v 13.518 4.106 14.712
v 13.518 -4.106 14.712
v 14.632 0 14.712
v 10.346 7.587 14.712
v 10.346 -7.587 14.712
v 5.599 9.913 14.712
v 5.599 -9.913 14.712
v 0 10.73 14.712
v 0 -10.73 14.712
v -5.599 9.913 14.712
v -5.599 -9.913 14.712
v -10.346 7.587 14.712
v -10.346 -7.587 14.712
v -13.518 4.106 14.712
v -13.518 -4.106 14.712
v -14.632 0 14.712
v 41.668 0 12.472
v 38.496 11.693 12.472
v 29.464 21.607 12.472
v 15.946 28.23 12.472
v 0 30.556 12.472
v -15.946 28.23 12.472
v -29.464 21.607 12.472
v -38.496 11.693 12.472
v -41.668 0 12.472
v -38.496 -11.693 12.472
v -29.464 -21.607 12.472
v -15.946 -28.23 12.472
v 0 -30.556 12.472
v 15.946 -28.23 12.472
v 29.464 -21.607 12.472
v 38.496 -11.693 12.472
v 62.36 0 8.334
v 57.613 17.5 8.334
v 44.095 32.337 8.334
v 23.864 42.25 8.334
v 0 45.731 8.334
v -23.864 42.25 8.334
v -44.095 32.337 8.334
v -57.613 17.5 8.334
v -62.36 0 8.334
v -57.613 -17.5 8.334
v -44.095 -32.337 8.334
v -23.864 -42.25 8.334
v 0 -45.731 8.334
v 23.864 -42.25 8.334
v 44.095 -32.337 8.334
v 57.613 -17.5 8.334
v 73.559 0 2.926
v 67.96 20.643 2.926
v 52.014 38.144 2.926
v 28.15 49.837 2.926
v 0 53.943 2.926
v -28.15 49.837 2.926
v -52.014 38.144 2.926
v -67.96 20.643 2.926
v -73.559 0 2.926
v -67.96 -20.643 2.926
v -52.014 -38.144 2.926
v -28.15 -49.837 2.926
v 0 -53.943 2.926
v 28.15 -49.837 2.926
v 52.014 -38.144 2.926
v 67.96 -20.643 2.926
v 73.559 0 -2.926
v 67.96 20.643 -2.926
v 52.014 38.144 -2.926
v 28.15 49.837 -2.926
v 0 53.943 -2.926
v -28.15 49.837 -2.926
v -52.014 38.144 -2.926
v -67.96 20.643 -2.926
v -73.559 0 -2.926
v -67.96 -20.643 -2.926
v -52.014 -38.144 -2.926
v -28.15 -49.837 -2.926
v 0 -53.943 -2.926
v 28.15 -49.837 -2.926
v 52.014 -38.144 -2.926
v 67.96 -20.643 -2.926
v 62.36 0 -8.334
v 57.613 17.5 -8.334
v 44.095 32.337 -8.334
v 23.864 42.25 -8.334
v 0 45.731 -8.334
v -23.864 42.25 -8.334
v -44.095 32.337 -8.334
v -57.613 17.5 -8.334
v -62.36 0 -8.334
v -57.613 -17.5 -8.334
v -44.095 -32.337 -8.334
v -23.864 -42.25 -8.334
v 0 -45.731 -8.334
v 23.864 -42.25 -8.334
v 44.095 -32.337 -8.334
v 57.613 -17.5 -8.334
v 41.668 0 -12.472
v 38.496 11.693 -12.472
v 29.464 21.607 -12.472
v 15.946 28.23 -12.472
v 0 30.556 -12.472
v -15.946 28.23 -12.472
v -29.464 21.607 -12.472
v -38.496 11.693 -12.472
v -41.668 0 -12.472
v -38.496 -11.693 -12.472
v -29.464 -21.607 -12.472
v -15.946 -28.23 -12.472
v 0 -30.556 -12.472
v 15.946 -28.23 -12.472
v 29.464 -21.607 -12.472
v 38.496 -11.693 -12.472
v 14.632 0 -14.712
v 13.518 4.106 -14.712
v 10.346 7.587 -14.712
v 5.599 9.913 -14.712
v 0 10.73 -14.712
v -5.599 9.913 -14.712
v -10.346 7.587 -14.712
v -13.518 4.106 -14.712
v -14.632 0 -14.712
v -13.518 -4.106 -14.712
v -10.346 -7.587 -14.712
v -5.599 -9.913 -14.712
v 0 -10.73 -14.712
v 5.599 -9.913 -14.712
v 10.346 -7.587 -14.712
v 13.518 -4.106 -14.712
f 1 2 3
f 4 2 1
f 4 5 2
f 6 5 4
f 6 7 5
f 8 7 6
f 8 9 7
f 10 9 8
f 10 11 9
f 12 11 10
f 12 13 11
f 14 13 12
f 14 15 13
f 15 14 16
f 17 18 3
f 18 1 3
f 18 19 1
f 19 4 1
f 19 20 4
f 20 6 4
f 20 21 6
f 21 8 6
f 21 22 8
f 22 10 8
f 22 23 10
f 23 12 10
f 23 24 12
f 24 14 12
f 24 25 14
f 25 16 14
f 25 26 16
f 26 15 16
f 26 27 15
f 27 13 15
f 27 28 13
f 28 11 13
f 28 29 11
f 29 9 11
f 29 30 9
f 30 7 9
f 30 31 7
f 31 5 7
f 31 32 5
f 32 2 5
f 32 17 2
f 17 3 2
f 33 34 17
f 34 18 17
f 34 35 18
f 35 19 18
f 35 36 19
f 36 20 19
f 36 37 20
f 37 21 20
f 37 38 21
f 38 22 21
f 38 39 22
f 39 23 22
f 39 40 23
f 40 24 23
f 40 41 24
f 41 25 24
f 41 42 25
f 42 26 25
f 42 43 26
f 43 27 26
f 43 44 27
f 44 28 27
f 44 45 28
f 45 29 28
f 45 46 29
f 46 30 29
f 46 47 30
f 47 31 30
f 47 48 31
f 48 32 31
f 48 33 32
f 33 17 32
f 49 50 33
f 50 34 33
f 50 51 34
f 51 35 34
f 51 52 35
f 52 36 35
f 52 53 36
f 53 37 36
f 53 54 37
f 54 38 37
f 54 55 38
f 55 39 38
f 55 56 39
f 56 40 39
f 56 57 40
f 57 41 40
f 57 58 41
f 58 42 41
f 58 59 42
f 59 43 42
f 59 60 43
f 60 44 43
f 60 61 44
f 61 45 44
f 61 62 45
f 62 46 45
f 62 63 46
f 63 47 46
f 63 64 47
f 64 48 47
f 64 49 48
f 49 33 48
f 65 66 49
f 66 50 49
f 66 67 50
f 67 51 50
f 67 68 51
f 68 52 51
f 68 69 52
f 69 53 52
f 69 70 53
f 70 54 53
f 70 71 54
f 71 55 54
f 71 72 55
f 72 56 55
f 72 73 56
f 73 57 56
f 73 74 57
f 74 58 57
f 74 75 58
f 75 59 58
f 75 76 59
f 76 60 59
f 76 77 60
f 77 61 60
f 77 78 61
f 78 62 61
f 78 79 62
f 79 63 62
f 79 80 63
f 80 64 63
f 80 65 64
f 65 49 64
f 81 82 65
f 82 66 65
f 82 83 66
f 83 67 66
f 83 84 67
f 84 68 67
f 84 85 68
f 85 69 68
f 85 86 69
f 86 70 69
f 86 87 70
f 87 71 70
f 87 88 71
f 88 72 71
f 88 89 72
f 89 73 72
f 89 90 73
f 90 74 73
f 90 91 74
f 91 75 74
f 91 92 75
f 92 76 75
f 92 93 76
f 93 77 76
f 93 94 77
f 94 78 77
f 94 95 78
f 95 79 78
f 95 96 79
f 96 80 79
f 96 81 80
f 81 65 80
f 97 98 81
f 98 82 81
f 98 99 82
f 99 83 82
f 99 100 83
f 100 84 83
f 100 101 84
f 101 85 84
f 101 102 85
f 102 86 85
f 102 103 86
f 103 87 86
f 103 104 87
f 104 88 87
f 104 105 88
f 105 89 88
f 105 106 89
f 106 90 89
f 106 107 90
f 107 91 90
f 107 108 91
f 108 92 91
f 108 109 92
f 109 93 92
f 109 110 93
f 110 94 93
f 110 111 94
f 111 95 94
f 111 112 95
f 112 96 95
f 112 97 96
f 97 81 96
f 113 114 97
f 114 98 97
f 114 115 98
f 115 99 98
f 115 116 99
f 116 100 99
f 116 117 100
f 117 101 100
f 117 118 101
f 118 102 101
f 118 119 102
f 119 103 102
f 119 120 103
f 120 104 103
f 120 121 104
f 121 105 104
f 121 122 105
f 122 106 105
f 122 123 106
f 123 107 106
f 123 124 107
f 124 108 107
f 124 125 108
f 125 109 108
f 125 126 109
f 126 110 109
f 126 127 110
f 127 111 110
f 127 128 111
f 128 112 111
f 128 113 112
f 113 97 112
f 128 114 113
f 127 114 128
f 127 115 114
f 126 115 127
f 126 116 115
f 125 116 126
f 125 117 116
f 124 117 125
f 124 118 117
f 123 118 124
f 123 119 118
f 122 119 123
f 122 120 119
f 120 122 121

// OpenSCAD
// Generated by SolidPython 1.0.1 on 2020-07-29 00:46:52


scale(v = [15, 11, 3]) {
	sphere(r = 5);
}
/***********************************************
*********      SolidPython code:      **********
************************************************
 
# import packages: SolidPython
from solid import *
from solid.utils import *
from itertools import chain, combinations, permutations


class Resize:

    def __init__(self, scad_file):
        self.scad_file = scad_file
        #self.scad_file = import_scad(scad_file)
        # cone/cylinder param:
        self.r1 = 0
        self.r2 = 0
        self.h = 0
        # rectangular prism param:
        self.w = 0
        self.l = 0
        # ellipse param:
        self.r = 0

    # import OpenScad code (file name corresponds to shape)


    # classify shape + parameters
    def assign(self, param1, param2, param3):
        if self.scad_file == 'cone.scad':
            self.r1 = param1
            self.r2 = param2
            self.h = param3
        elif self.scad_file == 'cylinder.scad':
            self.r1 = param1
            self.r2 = param2
            self.h = param3
        elif self.scad_file == 'rectangularPrism.scad':
            self.h = param1
            self.l = param2
            self.w = param3
        else:
            self.r = param1
            self.h = param2

    # resize parameters
    def iterate(self):
        x = range(3, 20, 2)
        i = 1
        if self.scad_file == 'cone.scad':
            tempList = list(permutations(x, 2))
            for temp in tempList:
                param1 = temp[0]
                param2 = temp[1]
                filepath = 'produced_scad_files/' + 'cone' + str(param1) + '_' + str(param2) + '_' + '.scad'
                scad_render_to_file(cylinder(h=param1, r1=param2, r2=0), filepath)

        elif self.scad_file == 'cylinder.scad':
            tempList = list(permutations(x, 3))
            for temp in tempList:
                param1 = temp[0]
                param2 = temp[1]
                filepath = 'produced_scad_files/' + 'cylinder' + str(param1) + '_' + str(param2) + '_' + '.scad'
                scad_render_to_file(cylinder(h=param1, r1=param2, r2=param2), filepath)

        elif self.scad_file == 'rectangularPrism.scad':
            tempList = list(permutations(x, 3))
            for temp in tempList:
                param1 = temp[0]
                param2 = temp[1]
                param3 = temp[2]
                filepath = 'produced_scad_files/' + 'rectangularPrism' + str(param1) + '_' + str(param2) + '_' + str(
                    param3) + '.scad'
                scad_render_to_file(cube(size=(param1, param2, param3)), filepath)

        elif self.scad_file == 'ellipse.scad':
            tempList = list(permutations(x, 4))
            for temp in tempList:
                param1 = temp[0]
                param2 = temp[1]
                param3 = temp[2]
                param4 = temp[3]
                filepath = 'produced_scad_files/' + 'ellipse' + str(param1) + '_' + str(param2) + '_' + str(param3) + '_' + str(param4) + '.scad'
                scad_render_to_file(scale([param1, param2, param3])(sphere(r=param4)), filepath)

    def render_to_scadfile(self):
        scad_render_to_file(scad, 'example.scad') 
 
************************************************/
